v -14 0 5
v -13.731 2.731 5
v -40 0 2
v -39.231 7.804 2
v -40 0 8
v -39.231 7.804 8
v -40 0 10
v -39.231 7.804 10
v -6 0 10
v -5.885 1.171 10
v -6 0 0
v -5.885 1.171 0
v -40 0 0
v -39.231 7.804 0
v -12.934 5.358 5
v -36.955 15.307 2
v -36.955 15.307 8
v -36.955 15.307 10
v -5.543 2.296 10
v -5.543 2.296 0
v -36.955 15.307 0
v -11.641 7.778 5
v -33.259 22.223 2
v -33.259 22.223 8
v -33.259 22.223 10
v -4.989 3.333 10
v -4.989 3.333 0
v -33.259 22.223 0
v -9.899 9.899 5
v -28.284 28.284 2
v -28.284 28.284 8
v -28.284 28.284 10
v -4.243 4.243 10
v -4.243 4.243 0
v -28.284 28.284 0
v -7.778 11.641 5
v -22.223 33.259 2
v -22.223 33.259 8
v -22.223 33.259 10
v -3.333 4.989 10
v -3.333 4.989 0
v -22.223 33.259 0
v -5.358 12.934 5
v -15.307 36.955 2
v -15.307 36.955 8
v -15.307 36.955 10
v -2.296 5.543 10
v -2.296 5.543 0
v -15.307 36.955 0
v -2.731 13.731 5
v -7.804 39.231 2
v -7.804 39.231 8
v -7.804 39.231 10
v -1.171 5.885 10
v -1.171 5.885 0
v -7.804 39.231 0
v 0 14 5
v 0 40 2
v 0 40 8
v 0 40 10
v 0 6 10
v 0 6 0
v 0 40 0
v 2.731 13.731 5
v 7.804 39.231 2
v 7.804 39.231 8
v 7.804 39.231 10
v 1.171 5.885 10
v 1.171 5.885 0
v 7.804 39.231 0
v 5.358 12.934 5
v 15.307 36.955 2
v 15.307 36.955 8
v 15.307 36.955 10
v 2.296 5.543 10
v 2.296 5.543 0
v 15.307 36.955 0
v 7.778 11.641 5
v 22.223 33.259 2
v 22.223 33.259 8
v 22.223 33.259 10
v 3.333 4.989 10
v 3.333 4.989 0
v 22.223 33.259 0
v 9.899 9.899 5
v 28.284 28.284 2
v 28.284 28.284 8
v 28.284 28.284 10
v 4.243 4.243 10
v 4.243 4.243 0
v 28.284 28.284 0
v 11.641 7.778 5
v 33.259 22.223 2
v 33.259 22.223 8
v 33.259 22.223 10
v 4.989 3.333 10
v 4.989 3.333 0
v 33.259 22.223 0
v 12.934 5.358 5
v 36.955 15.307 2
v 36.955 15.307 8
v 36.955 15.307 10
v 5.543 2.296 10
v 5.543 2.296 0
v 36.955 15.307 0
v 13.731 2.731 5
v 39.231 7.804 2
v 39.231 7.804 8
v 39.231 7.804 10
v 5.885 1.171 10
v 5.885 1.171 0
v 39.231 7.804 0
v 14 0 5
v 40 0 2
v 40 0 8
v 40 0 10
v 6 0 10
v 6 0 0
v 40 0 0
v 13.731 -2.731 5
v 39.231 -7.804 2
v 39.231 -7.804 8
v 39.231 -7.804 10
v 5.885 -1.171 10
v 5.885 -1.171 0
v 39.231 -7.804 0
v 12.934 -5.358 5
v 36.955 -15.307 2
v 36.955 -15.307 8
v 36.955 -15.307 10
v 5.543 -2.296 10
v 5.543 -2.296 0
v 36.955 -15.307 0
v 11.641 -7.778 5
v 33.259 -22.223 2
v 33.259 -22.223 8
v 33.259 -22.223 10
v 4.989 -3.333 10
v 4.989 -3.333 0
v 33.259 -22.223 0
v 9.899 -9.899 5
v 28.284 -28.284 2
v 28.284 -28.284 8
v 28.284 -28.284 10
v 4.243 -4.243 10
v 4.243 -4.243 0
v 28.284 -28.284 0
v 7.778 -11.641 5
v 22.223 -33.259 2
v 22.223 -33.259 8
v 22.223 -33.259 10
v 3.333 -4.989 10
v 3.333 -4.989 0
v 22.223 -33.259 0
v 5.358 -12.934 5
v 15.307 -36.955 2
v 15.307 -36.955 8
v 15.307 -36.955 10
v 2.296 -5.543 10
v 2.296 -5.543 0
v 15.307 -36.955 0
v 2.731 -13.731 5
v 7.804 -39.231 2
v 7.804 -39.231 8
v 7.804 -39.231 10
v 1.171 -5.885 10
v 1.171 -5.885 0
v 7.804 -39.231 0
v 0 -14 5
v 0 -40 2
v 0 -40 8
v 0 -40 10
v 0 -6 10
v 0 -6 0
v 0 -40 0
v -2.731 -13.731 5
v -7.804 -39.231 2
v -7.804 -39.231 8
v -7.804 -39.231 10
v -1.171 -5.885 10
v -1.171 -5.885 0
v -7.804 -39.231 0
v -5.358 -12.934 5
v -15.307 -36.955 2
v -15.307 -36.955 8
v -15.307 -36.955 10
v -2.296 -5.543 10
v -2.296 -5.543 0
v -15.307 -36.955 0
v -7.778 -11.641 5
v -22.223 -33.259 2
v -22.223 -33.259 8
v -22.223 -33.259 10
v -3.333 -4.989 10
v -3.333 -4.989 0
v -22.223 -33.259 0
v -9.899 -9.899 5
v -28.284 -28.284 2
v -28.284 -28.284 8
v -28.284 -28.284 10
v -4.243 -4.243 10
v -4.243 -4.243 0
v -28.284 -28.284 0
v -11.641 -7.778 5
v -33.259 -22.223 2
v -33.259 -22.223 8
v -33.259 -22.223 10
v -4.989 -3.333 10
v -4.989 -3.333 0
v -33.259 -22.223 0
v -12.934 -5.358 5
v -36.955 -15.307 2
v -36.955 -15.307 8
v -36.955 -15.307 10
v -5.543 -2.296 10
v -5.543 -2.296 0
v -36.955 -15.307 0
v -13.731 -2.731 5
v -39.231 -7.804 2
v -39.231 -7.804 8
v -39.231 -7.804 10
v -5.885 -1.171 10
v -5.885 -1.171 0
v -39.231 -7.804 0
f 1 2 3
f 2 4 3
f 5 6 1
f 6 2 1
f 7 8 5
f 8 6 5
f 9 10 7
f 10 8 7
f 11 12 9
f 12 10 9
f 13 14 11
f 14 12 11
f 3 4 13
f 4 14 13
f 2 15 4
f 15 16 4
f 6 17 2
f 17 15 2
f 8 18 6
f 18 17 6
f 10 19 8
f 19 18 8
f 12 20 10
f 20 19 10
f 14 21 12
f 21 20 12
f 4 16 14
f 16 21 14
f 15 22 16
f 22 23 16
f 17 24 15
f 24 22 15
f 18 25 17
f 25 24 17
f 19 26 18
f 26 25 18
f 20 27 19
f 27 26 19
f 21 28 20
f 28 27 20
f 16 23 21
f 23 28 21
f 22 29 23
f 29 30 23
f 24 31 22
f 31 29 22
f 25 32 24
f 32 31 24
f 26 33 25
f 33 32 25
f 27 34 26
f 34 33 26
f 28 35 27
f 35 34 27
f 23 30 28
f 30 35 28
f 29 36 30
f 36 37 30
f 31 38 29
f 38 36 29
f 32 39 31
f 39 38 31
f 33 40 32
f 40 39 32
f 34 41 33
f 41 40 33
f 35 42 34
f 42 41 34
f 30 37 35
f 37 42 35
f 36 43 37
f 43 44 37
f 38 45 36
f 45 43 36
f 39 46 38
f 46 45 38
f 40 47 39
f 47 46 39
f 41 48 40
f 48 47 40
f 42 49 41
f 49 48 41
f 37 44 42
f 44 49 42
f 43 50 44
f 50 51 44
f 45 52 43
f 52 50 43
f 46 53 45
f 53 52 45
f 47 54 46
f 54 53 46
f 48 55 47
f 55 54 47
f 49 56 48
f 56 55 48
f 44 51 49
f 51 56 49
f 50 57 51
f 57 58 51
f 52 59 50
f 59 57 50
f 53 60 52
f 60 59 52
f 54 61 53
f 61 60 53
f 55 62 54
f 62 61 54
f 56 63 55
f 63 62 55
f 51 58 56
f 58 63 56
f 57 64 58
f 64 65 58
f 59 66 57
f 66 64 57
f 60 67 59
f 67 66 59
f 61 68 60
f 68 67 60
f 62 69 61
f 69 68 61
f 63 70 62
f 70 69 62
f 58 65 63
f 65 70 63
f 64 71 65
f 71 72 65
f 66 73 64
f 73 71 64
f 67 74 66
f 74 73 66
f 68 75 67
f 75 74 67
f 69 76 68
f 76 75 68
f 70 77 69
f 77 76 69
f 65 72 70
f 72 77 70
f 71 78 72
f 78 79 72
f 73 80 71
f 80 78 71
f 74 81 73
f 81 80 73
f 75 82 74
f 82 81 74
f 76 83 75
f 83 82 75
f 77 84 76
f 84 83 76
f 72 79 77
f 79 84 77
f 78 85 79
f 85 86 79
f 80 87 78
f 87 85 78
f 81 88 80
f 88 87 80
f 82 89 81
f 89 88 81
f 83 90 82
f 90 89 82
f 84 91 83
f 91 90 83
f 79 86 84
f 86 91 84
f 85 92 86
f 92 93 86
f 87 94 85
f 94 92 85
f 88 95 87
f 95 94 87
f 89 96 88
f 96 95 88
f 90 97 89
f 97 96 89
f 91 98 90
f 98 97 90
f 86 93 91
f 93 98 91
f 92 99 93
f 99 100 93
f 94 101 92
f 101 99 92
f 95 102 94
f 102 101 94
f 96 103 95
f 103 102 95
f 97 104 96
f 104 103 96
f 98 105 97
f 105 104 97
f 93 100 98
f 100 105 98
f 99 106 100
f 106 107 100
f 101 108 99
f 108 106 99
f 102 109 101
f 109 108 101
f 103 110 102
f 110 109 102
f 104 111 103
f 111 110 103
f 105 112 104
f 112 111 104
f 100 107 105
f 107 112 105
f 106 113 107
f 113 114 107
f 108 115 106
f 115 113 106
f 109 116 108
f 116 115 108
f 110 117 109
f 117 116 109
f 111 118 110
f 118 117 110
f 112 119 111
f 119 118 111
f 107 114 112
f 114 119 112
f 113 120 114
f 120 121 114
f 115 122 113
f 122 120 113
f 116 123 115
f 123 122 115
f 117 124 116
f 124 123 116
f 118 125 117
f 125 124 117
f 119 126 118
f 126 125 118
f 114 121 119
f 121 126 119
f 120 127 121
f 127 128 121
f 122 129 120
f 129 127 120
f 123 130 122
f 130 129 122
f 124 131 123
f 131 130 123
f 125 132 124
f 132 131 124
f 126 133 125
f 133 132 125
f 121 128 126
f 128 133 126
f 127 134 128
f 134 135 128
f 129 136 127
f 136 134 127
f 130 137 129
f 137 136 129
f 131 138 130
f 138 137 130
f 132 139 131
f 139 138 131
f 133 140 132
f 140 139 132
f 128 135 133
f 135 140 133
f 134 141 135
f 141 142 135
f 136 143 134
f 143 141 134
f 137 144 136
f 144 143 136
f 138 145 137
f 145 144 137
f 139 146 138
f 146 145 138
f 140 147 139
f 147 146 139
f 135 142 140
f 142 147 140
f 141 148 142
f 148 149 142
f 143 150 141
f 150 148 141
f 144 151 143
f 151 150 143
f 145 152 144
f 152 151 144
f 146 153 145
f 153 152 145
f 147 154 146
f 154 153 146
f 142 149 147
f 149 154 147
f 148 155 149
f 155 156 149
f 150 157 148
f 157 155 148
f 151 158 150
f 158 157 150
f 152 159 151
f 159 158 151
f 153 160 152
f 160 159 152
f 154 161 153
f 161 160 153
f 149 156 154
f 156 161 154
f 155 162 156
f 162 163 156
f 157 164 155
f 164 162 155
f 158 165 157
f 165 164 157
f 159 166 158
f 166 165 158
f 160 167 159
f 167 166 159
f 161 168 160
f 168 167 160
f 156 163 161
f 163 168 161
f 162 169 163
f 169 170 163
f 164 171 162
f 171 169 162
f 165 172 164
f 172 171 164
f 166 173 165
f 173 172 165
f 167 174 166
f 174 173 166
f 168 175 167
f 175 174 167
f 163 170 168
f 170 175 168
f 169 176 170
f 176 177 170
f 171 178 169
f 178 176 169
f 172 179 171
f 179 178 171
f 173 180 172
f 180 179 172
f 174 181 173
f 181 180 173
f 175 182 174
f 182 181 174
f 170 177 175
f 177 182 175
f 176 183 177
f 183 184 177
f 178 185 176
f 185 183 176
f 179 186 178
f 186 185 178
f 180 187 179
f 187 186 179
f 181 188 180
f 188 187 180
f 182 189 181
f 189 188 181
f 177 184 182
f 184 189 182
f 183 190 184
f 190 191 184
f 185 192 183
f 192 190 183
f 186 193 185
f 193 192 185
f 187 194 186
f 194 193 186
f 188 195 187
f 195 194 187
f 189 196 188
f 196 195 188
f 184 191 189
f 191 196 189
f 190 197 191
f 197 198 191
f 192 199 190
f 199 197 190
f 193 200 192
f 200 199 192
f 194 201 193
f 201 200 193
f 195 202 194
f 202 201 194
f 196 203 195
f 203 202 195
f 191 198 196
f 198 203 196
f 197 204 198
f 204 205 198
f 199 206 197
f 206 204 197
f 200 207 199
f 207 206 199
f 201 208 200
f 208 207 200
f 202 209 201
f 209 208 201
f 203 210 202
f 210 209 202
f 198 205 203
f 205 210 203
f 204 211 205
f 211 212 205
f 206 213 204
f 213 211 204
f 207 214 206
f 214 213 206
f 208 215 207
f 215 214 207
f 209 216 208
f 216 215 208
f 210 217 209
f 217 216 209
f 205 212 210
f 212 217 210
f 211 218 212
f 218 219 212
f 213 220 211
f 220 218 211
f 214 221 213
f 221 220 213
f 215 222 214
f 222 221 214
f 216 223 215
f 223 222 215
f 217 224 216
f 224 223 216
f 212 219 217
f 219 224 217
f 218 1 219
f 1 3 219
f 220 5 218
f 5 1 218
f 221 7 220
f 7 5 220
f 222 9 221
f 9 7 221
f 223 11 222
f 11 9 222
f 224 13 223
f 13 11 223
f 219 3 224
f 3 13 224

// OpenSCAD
$fn = 32;

// ----------------------------------------------------------------------
// Revolved part: V-groove pulley R40
// ----------------------------------------------------------------------

// --- parameters (mm) ---
bore_r = 6;               // bore radius
rim_r = 40;               // rim radius
rim_t = 10;               // rim width
groove_r = 14;            // groove root radius
groove_w = 3;             // groove half width
revolve_angle = 360;      // revolve sweep, degrees
fit_tol = 0.02;           // declared fit tolerance (prompt contract)
free_tol = 0.2;           // declared free tolerance (prompt contract)

bore_d = 2 * bore_r;
rim_d = 2 * rim_r;
groove_d = 2 * groove_r;

profile = [[6, 0], [40, 0], [40, 2], [14, 5], [40, 8], [40, 10], [6, 10]];  // primary outline, 7 points, counter clockwise

// --- the one profile operation ---
rotate_extrude(angle = revolve_angle) polygon(points = profile);
